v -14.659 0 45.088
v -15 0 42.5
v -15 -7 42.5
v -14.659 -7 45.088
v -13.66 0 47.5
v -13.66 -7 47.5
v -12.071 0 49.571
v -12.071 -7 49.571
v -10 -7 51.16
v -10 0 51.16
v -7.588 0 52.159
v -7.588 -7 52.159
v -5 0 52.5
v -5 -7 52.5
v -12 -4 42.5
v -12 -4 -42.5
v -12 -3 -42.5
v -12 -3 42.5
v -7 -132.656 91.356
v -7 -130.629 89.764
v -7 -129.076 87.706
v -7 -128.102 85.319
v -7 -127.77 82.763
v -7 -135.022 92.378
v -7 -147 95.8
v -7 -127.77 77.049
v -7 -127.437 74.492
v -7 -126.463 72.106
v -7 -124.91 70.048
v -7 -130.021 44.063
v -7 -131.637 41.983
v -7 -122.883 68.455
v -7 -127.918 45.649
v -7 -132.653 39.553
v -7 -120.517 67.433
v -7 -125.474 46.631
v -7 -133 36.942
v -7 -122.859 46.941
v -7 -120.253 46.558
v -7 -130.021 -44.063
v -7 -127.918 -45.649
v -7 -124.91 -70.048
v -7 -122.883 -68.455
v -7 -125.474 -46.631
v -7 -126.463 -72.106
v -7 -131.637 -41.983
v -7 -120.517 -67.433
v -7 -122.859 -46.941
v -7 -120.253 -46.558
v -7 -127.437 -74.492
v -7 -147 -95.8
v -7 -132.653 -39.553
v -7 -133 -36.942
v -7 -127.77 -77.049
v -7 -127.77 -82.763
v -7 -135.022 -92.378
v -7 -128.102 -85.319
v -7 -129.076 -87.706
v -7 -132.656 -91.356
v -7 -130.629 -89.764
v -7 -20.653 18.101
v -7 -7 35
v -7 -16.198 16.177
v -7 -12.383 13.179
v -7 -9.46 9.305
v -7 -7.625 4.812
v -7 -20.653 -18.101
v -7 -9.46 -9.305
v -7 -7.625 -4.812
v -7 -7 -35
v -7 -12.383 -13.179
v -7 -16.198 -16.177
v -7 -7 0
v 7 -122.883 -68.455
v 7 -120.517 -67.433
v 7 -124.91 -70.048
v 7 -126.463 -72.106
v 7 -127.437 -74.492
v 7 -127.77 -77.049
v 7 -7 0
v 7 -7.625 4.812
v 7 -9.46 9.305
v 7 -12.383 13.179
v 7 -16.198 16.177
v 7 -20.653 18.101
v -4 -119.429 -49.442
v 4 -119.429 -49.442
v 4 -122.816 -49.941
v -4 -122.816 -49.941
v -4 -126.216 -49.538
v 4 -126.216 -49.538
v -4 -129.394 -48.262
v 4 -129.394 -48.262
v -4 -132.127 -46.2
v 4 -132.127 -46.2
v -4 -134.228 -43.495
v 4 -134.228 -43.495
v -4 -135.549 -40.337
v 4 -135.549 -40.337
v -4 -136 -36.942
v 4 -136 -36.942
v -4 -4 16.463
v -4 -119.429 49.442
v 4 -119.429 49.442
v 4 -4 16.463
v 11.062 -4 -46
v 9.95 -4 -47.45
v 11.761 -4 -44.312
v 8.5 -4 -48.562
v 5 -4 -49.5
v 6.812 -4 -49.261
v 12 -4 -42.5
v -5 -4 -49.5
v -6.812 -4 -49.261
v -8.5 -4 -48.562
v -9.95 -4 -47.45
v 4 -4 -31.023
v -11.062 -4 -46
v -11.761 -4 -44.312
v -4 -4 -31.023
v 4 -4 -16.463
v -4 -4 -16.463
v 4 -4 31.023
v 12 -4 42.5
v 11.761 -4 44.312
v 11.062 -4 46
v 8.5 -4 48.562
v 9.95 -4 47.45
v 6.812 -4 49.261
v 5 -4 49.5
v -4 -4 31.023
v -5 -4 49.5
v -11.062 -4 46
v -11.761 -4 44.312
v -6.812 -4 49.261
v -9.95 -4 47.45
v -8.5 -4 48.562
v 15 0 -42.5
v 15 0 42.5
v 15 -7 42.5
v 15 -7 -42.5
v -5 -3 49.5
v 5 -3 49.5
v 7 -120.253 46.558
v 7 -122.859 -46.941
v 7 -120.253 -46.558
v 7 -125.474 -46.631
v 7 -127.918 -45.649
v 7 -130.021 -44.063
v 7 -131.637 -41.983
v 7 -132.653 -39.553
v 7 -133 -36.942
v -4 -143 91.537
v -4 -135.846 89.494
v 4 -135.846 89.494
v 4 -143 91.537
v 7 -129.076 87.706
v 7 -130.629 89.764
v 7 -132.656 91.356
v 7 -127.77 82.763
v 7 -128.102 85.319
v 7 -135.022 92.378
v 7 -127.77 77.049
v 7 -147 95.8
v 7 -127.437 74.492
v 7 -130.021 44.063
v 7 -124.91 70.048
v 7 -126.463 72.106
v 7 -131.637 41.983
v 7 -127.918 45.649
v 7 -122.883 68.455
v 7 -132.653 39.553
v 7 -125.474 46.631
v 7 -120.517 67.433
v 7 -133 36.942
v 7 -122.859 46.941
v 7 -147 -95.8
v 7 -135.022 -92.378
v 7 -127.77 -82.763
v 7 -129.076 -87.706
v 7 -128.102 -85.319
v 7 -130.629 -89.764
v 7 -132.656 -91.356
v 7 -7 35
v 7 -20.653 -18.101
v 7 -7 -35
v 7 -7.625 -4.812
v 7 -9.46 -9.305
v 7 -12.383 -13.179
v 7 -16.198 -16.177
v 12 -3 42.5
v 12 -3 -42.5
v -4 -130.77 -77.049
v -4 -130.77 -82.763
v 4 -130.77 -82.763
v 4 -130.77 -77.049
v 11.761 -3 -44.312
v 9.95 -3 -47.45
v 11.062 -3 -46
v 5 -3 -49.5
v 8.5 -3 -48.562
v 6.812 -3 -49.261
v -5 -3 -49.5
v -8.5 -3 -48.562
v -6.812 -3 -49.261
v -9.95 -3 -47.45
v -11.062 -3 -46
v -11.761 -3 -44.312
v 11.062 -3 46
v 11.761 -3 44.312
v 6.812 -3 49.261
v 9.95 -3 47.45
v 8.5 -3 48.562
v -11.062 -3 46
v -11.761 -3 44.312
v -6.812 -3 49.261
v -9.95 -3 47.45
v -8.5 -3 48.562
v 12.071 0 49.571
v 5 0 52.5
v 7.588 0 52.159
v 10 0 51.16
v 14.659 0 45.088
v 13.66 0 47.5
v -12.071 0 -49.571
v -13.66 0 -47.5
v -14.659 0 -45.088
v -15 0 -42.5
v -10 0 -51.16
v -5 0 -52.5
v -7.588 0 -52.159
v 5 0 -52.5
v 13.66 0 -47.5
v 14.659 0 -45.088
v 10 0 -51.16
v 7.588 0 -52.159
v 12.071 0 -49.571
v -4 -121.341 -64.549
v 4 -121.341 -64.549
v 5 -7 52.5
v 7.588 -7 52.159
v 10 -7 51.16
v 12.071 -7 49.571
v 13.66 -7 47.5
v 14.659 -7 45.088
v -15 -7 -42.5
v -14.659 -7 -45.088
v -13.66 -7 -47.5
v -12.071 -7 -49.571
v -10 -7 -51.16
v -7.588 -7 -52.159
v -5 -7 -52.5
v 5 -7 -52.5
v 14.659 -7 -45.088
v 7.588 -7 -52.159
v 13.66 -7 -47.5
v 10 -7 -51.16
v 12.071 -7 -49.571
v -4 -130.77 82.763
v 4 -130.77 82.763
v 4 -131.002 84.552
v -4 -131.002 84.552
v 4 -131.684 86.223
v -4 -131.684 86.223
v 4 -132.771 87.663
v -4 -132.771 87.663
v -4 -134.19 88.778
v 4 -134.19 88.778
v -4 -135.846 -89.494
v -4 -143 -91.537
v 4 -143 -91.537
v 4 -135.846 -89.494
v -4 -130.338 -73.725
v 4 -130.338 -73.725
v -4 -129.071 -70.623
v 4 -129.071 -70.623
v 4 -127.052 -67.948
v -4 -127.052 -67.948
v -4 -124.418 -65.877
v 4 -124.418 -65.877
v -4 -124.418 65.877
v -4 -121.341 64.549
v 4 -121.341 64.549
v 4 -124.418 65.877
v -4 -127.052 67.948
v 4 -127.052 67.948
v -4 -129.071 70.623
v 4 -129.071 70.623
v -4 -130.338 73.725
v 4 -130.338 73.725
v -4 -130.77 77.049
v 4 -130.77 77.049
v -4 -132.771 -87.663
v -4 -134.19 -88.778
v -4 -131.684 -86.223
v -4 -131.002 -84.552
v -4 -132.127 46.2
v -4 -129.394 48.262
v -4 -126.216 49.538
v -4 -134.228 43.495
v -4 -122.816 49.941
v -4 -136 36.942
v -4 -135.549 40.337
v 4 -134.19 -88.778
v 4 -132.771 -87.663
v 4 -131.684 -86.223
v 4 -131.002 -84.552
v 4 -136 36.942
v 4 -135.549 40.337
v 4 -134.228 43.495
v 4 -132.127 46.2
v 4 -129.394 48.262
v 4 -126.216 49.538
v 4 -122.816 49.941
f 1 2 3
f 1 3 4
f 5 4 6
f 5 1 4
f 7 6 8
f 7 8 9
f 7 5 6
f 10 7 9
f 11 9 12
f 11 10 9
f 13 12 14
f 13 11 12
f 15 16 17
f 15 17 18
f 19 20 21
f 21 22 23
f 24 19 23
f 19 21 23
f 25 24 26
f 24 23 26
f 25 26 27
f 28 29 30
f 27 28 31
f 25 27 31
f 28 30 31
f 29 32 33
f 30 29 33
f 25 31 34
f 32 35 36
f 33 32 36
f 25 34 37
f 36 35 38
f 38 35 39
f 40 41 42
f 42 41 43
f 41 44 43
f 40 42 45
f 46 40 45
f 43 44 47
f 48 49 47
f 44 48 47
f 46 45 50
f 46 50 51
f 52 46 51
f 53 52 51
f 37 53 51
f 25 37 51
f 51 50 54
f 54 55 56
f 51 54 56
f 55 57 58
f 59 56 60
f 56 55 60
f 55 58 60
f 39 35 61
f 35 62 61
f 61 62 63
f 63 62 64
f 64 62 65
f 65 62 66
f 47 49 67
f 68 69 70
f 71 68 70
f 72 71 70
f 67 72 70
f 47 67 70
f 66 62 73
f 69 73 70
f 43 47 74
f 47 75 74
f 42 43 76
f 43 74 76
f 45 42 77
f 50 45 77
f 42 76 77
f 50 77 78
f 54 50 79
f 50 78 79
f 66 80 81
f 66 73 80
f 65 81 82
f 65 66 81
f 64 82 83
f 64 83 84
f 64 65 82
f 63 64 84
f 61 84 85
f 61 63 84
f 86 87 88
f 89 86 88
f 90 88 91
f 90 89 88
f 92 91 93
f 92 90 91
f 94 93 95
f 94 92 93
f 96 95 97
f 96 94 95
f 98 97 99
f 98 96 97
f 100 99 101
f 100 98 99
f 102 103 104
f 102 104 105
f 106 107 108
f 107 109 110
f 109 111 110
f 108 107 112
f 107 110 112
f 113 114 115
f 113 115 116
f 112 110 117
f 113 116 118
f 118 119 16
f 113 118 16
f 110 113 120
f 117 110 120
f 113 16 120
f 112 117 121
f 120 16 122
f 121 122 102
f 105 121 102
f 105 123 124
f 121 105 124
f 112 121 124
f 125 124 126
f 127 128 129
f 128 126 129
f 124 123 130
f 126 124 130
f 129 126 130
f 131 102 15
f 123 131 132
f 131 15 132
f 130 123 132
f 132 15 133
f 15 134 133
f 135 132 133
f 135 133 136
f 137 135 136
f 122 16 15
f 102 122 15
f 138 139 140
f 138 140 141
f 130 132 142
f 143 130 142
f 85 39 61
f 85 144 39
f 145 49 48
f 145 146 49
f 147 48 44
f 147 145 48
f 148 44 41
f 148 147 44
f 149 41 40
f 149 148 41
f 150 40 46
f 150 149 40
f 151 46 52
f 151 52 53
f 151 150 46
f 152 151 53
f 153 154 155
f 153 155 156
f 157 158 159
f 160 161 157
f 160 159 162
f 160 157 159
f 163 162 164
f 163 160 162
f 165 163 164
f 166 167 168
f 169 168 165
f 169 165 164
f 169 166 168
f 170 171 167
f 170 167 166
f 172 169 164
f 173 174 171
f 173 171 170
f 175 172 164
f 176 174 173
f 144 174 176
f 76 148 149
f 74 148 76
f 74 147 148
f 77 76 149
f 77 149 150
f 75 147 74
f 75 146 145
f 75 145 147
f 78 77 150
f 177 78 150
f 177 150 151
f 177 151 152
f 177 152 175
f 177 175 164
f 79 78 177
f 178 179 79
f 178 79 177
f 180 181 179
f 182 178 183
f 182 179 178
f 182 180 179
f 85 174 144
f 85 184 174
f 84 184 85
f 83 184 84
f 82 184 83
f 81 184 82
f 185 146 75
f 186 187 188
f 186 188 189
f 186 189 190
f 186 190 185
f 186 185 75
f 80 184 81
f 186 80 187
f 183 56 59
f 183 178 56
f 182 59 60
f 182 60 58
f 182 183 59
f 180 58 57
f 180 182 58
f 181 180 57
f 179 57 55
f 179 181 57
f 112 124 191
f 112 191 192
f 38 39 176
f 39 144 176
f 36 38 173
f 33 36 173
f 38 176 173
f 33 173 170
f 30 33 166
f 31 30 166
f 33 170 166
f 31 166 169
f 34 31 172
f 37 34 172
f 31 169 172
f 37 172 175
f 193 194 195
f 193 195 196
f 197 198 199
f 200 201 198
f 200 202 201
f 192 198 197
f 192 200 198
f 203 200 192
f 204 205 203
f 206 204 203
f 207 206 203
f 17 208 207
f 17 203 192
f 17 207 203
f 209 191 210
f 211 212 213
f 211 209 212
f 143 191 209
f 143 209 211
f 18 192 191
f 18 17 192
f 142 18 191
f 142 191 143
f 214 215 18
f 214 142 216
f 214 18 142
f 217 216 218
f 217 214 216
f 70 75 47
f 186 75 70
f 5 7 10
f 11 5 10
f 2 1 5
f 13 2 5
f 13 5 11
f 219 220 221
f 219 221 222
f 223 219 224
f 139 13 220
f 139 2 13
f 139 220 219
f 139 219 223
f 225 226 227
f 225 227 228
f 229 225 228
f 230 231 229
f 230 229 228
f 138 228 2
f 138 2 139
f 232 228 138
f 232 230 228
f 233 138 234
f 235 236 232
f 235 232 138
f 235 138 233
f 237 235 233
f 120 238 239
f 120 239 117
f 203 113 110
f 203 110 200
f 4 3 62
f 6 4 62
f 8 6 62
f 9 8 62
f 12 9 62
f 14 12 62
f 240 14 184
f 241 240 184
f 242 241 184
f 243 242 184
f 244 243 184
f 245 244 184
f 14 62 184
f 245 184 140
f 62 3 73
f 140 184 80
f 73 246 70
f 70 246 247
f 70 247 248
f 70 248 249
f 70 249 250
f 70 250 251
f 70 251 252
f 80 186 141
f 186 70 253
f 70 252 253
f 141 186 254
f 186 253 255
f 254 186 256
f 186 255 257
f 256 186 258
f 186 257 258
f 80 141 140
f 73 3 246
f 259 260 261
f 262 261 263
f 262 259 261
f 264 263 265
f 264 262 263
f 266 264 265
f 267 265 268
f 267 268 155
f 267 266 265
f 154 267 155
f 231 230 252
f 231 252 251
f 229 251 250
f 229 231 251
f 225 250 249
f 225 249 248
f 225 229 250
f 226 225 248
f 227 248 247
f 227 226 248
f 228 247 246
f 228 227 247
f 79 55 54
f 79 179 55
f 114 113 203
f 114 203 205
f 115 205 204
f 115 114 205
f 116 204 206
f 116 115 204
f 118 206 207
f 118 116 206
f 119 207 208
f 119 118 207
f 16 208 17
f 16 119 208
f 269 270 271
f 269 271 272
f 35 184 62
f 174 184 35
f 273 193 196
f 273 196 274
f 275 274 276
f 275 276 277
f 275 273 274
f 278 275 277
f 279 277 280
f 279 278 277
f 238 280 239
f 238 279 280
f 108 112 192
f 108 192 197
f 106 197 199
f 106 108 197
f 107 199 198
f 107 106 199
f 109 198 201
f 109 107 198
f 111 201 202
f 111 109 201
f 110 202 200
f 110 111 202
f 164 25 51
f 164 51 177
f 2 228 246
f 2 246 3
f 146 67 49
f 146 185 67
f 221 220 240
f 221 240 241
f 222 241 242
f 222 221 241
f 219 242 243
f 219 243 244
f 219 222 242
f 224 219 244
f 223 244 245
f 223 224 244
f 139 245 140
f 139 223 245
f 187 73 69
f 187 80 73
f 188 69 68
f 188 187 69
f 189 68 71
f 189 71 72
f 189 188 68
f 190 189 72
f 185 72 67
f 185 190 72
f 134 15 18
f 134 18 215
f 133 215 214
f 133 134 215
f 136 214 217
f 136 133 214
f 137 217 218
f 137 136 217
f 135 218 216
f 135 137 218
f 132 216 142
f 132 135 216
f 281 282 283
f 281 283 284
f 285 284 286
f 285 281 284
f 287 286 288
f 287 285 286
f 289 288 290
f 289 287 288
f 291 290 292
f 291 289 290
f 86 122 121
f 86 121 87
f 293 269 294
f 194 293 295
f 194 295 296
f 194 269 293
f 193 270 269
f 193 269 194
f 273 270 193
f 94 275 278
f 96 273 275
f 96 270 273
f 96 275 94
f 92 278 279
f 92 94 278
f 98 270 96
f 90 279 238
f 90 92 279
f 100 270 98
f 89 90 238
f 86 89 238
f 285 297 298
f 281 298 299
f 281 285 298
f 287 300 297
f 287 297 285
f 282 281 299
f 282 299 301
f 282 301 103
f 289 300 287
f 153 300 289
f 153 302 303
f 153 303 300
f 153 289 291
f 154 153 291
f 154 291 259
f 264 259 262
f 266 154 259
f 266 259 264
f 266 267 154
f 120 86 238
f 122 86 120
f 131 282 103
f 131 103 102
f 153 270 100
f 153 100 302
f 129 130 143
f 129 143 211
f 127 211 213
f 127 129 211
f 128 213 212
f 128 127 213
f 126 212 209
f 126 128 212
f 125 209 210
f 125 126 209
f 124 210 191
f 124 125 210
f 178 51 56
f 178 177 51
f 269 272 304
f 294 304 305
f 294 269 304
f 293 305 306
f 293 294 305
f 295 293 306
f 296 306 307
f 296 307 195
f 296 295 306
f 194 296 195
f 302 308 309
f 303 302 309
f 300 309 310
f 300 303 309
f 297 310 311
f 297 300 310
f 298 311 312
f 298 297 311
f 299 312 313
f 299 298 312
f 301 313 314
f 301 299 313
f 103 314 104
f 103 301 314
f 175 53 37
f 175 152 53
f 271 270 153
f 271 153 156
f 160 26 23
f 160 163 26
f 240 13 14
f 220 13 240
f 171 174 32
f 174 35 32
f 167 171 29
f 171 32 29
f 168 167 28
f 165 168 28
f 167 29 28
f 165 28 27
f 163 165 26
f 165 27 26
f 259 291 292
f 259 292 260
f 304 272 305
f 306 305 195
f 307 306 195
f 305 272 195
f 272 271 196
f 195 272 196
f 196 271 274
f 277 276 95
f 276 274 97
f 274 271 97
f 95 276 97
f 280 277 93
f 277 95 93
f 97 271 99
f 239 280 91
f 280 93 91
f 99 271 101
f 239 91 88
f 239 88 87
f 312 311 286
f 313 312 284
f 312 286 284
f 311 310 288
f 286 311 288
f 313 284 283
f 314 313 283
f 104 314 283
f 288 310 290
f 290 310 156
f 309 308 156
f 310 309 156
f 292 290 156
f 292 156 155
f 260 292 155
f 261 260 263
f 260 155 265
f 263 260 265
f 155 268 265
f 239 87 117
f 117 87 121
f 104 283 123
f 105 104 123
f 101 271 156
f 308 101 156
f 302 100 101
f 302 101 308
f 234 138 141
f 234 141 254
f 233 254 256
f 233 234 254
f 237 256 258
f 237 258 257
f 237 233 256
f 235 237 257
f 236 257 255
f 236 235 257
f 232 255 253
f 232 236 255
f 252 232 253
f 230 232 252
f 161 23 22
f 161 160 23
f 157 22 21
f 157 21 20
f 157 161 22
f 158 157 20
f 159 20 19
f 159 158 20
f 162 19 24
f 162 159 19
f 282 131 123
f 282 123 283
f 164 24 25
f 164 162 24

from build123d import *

# Parameters (mm, degrees)
BOSS_EXTRUDE3_DEPTH = 7
BOSS_EXTRUDE4_DEPTH = 7
FILLET2_R           = 10
SHELL8_START        = -4
SHELL8_DEPTH        = 8
SHELL8_START_2      = -5
SHELL8_2_OUTLINE_W  = 1
SHELL8_2_OUTLINE_H  = 99
SHELL8_2_DEPTH      = 10
SHELL8_3_DEPTH      = 1
SKETCH14_W          = 8
SKETCH14_H          = 185.360533748
BOSS_EXTRUDE5_DEPTH = 4
FILLET5_R           = 18.82495


with BuildPart() as part:
    # Sketch10 → Boss-Extrude3 (new body)
    with BuildSketch(Plane(origin=(0, 0, 0), x_dir=(1, 0, 0), z_dir=(0, 1, 0))):
        with BuildLine():
            Line((-5, -52.5), (5, -52.5))
            ThreePointArc((5, -52.5), (12.071067812, -49.571067812), (15, -42.5))
            Line((15, -42.5), (15, 42.5))
            ThreePointArc((15, 42.5), (12.071067812, 49.571067812), (5, 52.5))
            Line((5, 52.5), (-5, 52.5))
            ThreePointArc((-5, 52.5), (-12.071067812, 49.571067812), (-15, 42.5))
            Line((-15, 42.5), (-15, -42.5))
            ThreePointArc((-15, -42.5), (-12.071067812, -49.571067812), (-5, -52.5))
        make_face()
    extrude(amount=-BOSS_EXTRUDE3_DEPTH)

    # Sketch11 → Boss-Extrude4 (add, symmetric)
    with BuildSketch(Plane(origin=(0, 0, 0), x_dir=(0, 0, -1), z_dir=(1, 0, 0))):
        Polygon((-71, -133), (-69.505577442, -127.769521047), (-90.305891411, -127.769521047), (-95.800313969, -147), (-75, -147), align=None)
        Polygon((0, -133), (-50.199686031, -133), (-71, -133), (-75, -147), (0, -147), align=None)
        Polygon((50.199686031, -133), (0, -133), (0, -147), (75, -147), (71, -133), align=None)
        Polygon((-14.199686031, -7), (-35, -7), (-69.505577442, -127.769521047), (-71, -133), (-50.199686031, -133), align=None)
        Polygon((35, -7), (14.199686031, -7), (50.199686031, -133), (71, -133), (69.505577442, -127.769521047), align=None)
        Polygon((90.305891411, -127.769521047), (69.505577442, -127.769521047), (71, -133), (75, -147), (95.800313969, -147), align=None)
    extrude(amount=BOSS_EXTRUDE4_DEPTH, both=True)

    # Fillet2
    fillet2_edges = [part.edges().sort_by_distance(p)[0] for p in [
        (0, -133, -50.199686031),
        (0, -133, 50.199686031),
        (0, -127.769521047, 69.505577442),
        (0, -127.769521047, 90.305891411),
        (0, -127.769521047, -90.305891411),
        (0, -127.769521047, -69.505577442),
    ]]
    fillet(fillet2_edges, radius=FILLET2_R)

    # Shell8: read off the stored shape, not the designer's step
    # Shell8 outline → Shell8 (cut)
    with BuildSketch(Plane.YZ.offset(SHELL8_START)):
        with BuildLine():
            Line((-3, -49.5), (-3, 49.5))
            Line((-3, 49.5), (-4, 49.5))
            Line((-4, 49.5), (-4, 31.022810047))
            Line((-4, 31.022810047), (-121.34089571, 64.54878025))
            ThreePointArc((-121.34089571, 64.54878025), (-128.148053473, 69.220049899), (-130.769521047, 77.04859157))
            Line((-130.769521047, 77.04859157), (-130.769521047, 82.762877284))
            ThreePointArc((-130.769521047, 82.762877284), (-132.18108051, 86.978245876), (-135.846473152, 89.493544917))
            Line((-135.846473152, 89.493544917), (-147, 92.680266874))
            Line((-147, 92.680266874), (-147, -92.680266874))
            Line((-147, -92.680266874), (-135.846473152, -89.493544917))
            ThreePointArc((-135.846473152, -89.493544917), (-132.18108051, -86.978245876), (-130.769521047, -82.762877284))
            Line((-130.769521047, -82.762877284), (-130.769521047, -77.04859157))
            ThreePointArc((-130.769521047, -77.04859157), (-128.148053473, -69.220049899), (-121.34089571, -64.54878025))
            Line((-121.34089571, -64.54878025), (-4, -31.022810047))
            Line((-4, -31.022810047), (-4, -49.5))
            Line((-4, -49.5), (-3, -49.5))
        make_face()
        with BuildLine():
            Line((-4, 16.462590269), (-4, -16.462590269))
            Line((-4, -16.462590269), (-119.428625337, -49.442197508))
            ThreePointArc((-119.428625337, -49.442197508), (-130.828541671, -47.320918614), (-136, -36.942386189))
            Line((-136, -36.942386189), (-136, 36.942386189))
            ThreePointArc((-136, 36.942386189), (-130.828541671, 47.320918614), (-119.428625337, 49.442197508))
            Line((-119.428625337, 49.442197508), (-4, 16.462590269))
        make_face(mode=Mode.SUBTRACT)
    extrude(amount=SHELL8_DEPTH, mode=Mode.SUBTRACT)

    # Shell8 2 outline → Shell8 2 (cut)
    with BuildSketch(Plane.YZ.offset(SHELL8_START_2)):
        with Locations((-3.5, 0)):
            Rectangle(SHELL8_2_OUTLINE_W, SHELL8_2_OUTLINE_H)
    extrude(amount=SHELL8_2_DEPTH, mode=Mode.SUBTRACT)

    # Shell8 3 outline → Shell8 3 (cut)
    with BuildSketch(Plane(origin=(0, 0, 0), x_dir=(1, 0, 0), z_dir=(0, 1, 0)).offset(SHELL8_START)):
        with BuildLine():
            Line((5, 49.5), (5, -49.5))
            ThreePointArc((5, -49.5), (9.949747468, -47.449747468), (12, -42.5))
            Line((12, -42.5), (12, 42.5))
            ThreePointArc((12, 42.5), (9.949747468, 47.449747468), (5, 49.5))
        make_face()
        with BuildLine():
            Line((-12, 42.5), (-12, -42.5))
            ThreePointArc((-12, -42.5), (-9.949747468, -47.449747468), (-5, -49.5))
            Line((-5, -49.5), (-5, 49.5))
            ThreePointArc((-5, 49.5), (-9.949747468, 47.449747468), (-12, 42.5))
        make_face()
    extrude(amount=SHELL8_3_DEPTH, mode=Mode.SUBTRACT)

    # Sketch14 → Boss-Extrude5 (add)
    with BuildSketch(Plane.XZ.offset(147)):
        Rectangle(SKETCH14_W, SKETCH14_H)
    extrude(amount=-BOSS_EXTRUDE5_DEPTH)

    # Fillet5
    fillet5_edges = [part.edges().sort_by_distance(p)[0] for p in [
        (0, -7, 14.199686031),
        (0, -7, -14.199686031),
    ]]
    fillet(fillet5_edges, radius=FILLET5_R - 0.0001)  # a hair under: the kernel refuses the full size


solid = part.part
